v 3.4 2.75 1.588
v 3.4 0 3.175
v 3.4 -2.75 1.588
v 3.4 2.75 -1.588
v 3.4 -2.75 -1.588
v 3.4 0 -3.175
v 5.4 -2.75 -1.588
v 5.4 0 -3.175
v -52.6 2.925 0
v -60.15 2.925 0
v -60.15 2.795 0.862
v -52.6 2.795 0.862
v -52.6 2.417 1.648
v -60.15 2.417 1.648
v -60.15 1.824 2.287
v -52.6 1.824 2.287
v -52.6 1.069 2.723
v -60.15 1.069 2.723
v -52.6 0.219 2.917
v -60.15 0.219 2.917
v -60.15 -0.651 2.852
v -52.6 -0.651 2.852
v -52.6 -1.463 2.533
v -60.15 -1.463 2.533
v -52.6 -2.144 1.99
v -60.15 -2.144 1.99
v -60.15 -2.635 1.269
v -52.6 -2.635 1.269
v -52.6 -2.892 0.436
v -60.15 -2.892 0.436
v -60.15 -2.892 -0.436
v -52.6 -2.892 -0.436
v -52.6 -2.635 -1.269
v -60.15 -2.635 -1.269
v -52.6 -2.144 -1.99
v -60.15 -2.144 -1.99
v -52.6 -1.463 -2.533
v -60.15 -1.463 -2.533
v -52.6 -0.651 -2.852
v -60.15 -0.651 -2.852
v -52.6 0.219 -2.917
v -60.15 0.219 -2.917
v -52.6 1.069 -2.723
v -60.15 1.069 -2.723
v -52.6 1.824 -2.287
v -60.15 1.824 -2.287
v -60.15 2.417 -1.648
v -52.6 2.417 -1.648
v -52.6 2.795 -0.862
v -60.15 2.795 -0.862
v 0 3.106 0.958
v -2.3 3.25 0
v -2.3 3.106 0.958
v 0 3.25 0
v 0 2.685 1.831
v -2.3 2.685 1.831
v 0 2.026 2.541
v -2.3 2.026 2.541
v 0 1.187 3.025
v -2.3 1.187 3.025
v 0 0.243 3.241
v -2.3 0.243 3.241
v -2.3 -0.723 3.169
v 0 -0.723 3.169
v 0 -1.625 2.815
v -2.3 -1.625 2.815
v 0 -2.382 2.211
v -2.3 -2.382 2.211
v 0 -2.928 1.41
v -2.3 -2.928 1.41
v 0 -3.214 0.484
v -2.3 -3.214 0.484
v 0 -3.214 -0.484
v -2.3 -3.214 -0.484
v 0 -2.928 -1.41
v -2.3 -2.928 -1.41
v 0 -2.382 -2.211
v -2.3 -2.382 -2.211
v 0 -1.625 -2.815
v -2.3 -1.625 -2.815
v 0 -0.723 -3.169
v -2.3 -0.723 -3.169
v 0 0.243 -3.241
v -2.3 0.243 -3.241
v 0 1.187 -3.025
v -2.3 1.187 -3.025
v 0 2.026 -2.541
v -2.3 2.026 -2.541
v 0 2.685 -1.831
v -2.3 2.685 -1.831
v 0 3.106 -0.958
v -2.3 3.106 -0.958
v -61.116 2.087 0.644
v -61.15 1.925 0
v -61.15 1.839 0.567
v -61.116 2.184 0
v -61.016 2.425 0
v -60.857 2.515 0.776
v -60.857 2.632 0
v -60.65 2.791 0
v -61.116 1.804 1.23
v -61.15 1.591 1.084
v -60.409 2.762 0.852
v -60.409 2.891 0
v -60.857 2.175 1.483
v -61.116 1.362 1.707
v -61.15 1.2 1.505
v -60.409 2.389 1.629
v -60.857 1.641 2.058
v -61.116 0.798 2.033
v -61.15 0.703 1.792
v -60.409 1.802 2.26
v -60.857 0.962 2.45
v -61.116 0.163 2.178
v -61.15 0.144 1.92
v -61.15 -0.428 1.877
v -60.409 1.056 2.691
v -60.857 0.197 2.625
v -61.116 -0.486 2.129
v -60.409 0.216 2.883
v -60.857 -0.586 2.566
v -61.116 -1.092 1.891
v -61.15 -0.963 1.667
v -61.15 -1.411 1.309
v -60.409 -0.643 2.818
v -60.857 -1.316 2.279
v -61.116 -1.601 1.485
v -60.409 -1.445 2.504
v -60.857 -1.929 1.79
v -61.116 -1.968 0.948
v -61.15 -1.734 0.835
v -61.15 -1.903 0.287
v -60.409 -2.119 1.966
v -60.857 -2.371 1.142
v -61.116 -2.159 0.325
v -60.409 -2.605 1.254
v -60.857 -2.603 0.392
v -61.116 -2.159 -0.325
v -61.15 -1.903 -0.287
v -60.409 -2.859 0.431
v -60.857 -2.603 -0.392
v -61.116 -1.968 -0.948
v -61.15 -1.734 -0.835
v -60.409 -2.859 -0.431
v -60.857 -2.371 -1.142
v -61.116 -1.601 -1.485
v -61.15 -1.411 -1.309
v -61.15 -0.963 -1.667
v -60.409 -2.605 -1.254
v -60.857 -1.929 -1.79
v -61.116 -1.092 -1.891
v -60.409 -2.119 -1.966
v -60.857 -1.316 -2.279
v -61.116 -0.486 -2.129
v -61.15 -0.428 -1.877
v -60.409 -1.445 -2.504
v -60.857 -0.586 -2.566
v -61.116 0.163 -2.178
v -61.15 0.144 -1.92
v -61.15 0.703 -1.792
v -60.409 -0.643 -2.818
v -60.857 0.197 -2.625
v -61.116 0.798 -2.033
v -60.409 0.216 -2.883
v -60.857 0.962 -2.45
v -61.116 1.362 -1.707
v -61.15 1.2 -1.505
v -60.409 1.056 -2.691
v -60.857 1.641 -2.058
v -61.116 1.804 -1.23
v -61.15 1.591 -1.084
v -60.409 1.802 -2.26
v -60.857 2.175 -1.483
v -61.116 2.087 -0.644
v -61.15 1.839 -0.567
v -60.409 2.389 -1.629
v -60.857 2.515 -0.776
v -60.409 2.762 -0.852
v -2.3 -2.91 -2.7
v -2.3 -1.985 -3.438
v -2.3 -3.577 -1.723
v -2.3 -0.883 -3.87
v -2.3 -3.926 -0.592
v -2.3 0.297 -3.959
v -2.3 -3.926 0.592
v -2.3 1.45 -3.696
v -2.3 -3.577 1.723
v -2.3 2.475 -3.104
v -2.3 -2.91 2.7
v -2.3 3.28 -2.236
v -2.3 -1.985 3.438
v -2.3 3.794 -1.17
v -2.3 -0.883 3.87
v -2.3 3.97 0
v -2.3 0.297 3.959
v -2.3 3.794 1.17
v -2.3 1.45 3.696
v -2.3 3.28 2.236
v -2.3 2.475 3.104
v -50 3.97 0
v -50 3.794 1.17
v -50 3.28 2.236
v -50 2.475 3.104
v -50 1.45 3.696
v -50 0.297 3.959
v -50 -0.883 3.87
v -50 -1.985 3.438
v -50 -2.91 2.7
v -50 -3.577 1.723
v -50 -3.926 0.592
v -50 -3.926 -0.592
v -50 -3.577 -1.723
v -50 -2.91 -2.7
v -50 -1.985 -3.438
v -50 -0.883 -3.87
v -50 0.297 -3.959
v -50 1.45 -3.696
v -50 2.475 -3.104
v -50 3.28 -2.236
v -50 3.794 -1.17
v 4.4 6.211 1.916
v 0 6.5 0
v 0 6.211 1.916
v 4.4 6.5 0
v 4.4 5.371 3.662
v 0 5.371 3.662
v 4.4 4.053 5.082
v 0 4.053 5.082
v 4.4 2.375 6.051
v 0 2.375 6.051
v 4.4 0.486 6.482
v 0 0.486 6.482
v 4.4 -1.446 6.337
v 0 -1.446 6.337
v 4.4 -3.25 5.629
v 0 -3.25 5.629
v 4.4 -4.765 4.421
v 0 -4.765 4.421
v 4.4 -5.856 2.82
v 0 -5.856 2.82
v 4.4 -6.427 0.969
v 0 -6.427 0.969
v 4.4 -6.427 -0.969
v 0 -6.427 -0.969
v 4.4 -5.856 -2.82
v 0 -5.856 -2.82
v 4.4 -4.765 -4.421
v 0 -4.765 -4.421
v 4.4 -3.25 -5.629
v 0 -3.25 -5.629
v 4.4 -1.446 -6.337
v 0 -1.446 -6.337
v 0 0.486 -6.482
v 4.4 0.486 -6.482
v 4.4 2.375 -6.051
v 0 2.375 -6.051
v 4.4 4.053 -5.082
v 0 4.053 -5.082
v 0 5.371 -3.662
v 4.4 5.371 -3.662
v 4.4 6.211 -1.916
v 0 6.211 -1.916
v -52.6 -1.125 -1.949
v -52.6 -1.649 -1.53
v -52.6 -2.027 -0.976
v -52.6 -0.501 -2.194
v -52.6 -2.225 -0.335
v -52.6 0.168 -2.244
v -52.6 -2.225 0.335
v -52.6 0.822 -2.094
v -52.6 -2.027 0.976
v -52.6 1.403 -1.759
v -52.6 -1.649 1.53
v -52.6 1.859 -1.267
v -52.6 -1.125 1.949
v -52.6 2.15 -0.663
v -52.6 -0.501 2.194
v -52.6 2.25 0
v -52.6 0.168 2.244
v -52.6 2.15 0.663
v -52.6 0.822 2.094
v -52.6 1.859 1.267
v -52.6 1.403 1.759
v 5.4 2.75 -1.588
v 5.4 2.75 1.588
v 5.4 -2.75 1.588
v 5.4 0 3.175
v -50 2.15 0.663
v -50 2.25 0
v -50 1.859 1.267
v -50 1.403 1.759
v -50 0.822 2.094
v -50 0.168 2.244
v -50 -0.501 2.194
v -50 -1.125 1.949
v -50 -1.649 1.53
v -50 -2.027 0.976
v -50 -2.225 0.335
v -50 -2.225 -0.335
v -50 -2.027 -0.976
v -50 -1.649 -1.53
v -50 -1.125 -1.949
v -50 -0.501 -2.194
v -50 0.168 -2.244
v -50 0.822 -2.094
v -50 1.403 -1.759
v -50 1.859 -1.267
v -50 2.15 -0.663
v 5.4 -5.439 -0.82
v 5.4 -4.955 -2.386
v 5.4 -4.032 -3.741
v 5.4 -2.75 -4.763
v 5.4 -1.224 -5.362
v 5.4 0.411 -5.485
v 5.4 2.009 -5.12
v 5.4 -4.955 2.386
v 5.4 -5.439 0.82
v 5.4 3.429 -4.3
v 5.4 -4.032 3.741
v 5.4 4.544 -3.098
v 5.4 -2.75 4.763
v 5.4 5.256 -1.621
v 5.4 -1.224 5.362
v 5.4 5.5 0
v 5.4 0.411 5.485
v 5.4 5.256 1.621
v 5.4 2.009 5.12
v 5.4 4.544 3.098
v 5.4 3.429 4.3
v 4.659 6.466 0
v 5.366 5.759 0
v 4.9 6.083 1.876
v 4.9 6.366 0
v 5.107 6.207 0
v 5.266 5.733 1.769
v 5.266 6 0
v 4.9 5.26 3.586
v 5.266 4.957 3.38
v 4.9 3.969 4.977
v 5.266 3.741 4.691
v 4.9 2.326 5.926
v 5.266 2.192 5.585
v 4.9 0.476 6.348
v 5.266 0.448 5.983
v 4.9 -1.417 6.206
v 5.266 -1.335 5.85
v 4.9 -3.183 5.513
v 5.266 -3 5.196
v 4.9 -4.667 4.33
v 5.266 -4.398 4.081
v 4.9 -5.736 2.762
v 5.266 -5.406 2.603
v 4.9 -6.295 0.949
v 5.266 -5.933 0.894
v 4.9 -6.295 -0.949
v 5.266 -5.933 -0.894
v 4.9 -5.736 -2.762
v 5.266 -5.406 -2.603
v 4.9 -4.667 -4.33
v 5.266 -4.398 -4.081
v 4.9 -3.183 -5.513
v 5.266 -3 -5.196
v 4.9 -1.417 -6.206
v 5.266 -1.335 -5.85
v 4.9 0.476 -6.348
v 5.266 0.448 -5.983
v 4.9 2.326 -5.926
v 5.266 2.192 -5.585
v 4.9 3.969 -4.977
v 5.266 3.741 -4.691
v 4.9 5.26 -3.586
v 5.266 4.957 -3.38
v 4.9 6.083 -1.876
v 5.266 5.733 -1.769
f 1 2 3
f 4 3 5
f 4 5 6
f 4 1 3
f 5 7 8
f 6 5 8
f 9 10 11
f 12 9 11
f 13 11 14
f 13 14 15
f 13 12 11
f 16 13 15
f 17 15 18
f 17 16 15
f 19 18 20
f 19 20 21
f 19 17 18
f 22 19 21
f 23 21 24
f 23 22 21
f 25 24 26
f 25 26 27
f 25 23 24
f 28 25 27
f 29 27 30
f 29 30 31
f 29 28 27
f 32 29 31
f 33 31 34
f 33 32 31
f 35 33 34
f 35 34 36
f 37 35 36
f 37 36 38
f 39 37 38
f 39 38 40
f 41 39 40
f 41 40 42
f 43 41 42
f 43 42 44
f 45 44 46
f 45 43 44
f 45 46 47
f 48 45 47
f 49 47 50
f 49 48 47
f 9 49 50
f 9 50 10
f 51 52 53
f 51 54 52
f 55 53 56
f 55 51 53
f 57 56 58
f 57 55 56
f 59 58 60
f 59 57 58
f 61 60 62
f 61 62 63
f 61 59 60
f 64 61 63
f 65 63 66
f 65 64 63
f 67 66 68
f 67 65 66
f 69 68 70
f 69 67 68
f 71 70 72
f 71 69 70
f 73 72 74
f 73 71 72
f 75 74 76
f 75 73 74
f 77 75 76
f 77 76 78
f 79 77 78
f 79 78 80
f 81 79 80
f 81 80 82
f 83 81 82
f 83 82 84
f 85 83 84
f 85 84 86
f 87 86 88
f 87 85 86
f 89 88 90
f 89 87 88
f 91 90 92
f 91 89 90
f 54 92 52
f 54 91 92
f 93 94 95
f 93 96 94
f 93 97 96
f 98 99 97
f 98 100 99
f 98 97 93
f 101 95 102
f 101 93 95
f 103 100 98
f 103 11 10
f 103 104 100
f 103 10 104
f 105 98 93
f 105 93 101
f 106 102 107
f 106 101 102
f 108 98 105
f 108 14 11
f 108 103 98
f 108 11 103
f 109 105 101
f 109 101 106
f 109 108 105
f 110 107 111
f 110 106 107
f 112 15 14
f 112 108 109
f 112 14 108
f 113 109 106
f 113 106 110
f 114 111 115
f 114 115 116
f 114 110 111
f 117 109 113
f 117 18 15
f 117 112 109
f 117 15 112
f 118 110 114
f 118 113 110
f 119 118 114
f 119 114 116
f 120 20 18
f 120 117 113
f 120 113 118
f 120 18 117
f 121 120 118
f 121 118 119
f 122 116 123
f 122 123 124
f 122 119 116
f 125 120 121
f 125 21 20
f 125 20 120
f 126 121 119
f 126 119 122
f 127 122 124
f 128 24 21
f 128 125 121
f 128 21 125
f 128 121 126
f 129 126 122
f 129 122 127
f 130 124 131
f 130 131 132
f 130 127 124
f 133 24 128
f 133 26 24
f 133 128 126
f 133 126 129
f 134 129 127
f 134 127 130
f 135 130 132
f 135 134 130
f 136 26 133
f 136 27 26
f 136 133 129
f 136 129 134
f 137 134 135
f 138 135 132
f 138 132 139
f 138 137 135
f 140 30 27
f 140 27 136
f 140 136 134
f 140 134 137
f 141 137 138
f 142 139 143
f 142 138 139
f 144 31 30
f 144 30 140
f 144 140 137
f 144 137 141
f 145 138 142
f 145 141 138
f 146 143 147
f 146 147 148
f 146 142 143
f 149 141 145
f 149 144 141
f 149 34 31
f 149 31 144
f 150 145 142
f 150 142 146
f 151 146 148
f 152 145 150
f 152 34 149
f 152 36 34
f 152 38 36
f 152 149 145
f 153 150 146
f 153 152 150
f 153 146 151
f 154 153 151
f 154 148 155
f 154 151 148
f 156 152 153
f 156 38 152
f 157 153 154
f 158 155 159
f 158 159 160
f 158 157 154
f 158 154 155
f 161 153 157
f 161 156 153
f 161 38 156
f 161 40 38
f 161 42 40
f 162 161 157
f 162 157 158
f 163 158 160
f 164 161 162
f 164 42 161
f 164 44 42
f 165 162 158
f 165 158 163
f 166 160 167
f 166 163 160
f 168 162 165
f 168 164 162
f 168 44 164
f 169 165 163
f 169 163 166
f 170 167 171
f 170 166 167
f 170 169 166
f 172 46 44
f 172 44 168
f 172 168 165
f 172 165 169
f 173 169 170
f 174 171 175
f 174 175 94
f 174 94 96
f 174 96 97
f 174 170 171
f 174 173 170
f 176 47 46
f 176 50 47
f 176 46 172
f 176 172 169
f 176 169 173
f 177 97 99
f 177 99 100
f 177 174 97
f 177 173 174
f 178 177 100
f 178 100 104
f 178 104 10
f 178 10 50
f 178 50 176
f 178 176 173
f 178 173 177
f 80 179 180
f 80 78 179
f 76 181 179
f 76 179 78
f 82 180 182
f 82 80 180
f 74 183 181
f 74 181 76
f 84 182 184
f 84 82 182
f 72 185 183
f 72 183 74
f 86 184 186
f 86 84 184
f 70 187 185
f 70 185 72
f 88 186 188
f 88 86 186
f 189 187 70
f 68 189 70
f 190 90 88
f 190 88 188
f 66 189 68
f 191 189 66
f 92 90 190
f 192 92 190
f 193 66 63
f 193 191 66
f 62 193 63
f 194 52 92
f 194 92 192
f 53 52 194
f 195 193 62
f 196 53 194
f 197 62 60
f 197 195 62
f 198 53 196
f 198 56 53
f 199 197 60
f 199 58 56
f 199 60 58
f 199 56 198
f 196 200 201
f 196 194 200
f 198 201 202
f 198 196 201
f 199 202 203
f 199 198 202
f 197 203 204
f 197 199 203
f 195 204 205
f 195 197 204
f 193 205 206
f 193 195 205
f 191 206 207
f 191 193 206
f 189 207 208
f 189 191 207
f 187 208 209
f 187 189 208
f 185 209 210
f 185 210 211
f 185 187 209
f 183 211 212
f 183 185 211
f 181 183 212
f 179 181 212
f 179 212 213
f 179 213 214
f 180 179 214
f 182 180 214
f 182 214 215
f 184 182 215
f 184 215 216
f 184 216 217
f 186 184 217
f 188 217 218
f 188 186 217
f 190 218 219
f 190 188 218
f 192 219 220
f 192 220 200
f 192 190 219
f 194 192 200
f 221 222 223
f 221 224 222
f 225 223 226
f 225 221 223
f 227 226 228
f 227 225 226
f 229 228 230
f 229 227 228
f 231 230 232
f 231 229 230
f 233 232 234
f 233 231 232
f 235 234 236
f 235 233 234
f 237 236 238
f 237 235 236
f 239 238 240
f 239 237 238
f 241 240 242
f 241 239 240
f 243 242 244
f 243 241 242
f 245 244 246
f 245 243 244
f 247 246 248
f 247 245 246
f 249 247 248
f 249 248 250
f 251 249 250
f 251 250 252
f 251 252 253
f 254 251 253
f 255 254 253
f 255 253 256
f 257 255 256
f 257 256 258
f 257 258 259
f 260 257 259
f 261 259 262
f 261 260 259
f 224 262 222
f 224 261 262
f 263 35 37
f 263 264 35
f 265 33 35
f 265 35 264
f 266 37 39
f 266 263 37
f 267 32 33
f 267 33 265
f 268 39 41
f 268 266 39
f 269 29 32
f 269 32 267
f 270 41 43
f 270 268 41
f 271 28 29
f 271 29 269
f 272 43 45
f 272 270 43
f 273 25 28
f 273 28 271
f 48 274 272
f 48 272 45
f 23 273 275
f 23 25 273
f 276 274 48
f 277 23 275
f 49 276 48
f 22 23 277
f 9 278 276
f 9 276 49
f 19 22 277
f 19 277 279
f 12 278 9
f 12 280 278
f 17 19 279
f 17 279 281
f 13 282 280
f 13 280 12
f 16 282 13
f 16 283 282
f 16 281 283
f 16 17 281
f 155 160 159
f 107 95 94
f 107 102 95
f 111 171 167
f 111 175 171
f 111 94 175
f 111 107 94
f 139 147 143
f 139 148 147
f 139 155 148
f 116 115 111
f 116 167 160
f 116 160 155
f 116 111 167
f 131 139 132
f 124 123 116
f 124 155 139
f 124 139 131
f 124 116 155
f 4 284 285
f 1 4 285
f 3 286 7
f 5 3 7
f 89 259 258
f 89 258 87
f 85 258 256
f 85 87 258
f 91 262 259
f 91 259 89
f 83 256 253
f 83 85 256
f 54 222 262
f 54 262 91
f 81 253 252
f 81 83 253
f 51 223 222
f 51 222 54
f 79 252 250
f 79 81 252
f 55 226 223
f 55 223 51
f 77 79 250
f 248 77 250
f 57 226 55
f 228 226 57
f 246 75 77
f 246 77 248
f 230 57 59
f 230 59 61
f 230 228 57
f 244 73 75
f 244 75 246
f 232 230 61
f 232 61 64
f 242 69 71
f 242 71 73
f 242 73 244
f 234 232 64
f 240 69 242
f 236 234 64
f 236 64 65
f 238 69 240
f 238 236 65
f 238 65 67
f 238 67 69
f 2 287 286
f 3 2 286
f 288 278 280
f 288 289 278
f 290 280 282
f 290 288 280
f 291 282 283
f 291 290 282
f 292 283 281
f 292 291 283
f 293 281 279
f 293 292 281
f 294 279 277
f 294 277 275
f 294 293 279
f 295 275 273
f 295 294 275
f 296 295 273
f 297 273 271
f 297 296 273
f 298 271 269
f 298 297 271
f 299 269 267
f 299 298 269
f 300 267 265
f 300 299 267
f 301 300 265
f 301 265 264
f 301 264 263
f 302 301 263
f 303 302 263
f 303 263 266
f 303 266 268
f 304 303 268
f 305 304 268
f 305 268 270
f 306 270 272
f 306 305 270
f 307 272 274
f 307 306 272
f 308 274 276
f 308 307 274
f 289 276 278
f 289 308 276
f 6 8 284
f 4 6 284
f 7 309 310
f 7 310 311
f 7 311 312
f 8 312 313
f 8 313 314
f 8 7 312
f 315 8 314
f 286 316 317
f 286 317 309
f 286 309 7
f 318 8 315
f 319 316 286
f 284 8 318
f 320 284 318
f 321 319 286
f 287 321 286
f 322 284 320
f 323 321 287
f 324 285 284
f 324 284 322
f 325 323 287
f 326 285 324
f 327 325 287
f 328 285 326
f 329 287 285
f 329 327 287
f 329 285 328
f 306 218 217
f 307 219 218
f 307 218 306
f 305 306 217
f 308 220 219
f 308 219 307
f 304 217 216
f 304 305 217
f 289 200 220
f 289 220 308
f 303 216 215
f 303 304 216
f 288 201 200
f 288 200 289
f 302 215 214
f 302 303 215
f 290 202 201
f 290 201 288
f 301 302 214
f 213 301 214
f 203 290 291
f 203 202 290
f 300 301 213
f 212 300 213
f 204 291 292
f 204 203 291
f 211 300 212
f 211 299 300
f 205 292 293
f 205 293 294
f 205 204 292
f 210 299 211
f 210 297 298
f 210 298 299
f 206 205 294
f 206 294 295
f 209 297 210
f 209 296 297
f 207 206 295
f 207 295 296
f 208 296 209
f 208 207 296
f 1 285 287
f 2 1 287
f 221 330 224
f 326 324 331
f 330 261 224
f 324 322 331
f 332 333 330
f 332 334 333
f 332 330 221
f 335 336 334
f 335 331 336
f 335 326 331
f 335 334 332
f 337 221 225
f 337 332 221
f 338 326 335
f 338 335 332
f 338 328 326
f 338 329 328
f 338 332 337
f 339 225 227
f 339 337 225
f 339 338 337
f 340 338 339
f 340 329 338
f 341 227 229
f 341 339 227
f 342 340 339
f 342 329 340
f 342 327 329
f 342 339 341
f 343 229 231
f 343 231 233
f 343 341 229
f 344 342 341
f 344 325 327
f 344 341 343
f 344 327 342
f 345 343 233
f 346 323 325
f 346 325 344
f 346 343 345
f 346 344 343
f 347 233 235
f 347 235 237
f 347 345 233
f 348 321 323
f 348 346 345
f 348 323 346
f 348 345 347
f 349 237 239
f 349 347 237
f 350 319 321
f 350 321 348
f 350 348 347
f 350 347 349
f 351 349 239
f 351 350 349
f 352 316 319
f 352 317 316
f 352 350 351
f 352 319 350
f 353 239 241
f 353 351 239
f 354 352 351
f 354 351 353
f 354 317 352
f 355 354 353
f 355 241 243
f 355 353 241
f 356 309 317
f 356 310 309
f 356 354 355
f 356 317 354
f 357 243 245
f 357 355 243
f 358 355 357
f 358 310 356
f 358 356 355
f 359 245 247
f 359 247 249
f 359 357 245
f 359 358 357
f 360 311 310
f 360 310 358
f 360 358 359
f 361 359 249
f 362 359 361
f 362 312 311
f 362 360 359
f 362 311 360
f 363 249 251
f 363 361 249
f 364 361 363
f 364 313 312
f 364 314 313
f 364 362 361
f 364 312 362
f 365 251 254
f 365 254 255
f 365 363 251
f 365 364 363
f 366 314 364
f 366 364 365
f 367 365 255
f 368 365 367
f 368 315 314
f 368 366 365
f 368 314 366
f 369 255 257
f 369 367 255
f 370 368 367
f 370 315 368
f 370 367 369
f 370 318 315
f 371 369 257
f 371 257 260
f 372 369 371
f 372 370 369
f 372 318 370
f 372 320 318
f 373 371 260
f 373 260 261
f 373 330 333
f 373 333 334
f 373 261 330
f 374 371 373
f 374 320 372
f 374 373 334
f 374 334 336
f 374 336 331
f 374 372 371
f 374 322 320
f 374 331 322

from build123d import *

# Parameters (mm, degrees)
CUT_EXTRUDE1_DEPTH = 2


with BuildPart() as part:
    # Sketch2 → Revolve1 (revolve)
    with BuildSketch(Plane.XY):
        with BuildLine():
            Line((-50, 3.97), (-2.3, 3.97))
            Line((-2.3, 3.97), (-2.3, 3.25))
            Line((-2.3, 3.25), (0, 3.25))
            Line((0, 3.25), (0, 6.5))
            Line((0, 6.5), (4.4, 6.5))
            ThreePointArc((4.4, 6.5), (5.107106781, 6.207106781), (5.4, 5.5))
            Line((5.4, 5.5), (5.4, 0))
            Line((5.4, 0), (-61.15, 0))
            Line((-61.15, 0), (-61.15, 1.925))
            ThreePointArc((-61.15, 1.925), (-60.857106781, 2.632106781), (-60.15, 2.925))
            Line((-60.15, 2.925), (-52.6, 2.925))
            Line((-52.6, 2.925), (-52.6, 2.25))
            Line((-52.6, 2.25), (-50, 2.25))
            Line((-50, 2.25), (-50, 3.97))
        make_face()
    revolve(axis=Axis((-61.15, 0, 0), (1, 0, 0)))

    # Sketch3 → Cut-Extrude1 (cut)
    with BuildSketch(Plane(origin=(5.4, 0, 0), x_dir=(0, 0, -1), z_dir=(1, 0, 0))):
        Polygon((1.58771324, 2.75), (-1.58771324, 2.75), (-3.175426481, 0), (-1.58771324, -2.75), (1.58771324, -2.75), (3.175426481, 0), align=None)
    extrude(amount=-CUT_EXTRUDE1_DEPTH, mode=Mode.SUBTRACT)


solid = part.part
